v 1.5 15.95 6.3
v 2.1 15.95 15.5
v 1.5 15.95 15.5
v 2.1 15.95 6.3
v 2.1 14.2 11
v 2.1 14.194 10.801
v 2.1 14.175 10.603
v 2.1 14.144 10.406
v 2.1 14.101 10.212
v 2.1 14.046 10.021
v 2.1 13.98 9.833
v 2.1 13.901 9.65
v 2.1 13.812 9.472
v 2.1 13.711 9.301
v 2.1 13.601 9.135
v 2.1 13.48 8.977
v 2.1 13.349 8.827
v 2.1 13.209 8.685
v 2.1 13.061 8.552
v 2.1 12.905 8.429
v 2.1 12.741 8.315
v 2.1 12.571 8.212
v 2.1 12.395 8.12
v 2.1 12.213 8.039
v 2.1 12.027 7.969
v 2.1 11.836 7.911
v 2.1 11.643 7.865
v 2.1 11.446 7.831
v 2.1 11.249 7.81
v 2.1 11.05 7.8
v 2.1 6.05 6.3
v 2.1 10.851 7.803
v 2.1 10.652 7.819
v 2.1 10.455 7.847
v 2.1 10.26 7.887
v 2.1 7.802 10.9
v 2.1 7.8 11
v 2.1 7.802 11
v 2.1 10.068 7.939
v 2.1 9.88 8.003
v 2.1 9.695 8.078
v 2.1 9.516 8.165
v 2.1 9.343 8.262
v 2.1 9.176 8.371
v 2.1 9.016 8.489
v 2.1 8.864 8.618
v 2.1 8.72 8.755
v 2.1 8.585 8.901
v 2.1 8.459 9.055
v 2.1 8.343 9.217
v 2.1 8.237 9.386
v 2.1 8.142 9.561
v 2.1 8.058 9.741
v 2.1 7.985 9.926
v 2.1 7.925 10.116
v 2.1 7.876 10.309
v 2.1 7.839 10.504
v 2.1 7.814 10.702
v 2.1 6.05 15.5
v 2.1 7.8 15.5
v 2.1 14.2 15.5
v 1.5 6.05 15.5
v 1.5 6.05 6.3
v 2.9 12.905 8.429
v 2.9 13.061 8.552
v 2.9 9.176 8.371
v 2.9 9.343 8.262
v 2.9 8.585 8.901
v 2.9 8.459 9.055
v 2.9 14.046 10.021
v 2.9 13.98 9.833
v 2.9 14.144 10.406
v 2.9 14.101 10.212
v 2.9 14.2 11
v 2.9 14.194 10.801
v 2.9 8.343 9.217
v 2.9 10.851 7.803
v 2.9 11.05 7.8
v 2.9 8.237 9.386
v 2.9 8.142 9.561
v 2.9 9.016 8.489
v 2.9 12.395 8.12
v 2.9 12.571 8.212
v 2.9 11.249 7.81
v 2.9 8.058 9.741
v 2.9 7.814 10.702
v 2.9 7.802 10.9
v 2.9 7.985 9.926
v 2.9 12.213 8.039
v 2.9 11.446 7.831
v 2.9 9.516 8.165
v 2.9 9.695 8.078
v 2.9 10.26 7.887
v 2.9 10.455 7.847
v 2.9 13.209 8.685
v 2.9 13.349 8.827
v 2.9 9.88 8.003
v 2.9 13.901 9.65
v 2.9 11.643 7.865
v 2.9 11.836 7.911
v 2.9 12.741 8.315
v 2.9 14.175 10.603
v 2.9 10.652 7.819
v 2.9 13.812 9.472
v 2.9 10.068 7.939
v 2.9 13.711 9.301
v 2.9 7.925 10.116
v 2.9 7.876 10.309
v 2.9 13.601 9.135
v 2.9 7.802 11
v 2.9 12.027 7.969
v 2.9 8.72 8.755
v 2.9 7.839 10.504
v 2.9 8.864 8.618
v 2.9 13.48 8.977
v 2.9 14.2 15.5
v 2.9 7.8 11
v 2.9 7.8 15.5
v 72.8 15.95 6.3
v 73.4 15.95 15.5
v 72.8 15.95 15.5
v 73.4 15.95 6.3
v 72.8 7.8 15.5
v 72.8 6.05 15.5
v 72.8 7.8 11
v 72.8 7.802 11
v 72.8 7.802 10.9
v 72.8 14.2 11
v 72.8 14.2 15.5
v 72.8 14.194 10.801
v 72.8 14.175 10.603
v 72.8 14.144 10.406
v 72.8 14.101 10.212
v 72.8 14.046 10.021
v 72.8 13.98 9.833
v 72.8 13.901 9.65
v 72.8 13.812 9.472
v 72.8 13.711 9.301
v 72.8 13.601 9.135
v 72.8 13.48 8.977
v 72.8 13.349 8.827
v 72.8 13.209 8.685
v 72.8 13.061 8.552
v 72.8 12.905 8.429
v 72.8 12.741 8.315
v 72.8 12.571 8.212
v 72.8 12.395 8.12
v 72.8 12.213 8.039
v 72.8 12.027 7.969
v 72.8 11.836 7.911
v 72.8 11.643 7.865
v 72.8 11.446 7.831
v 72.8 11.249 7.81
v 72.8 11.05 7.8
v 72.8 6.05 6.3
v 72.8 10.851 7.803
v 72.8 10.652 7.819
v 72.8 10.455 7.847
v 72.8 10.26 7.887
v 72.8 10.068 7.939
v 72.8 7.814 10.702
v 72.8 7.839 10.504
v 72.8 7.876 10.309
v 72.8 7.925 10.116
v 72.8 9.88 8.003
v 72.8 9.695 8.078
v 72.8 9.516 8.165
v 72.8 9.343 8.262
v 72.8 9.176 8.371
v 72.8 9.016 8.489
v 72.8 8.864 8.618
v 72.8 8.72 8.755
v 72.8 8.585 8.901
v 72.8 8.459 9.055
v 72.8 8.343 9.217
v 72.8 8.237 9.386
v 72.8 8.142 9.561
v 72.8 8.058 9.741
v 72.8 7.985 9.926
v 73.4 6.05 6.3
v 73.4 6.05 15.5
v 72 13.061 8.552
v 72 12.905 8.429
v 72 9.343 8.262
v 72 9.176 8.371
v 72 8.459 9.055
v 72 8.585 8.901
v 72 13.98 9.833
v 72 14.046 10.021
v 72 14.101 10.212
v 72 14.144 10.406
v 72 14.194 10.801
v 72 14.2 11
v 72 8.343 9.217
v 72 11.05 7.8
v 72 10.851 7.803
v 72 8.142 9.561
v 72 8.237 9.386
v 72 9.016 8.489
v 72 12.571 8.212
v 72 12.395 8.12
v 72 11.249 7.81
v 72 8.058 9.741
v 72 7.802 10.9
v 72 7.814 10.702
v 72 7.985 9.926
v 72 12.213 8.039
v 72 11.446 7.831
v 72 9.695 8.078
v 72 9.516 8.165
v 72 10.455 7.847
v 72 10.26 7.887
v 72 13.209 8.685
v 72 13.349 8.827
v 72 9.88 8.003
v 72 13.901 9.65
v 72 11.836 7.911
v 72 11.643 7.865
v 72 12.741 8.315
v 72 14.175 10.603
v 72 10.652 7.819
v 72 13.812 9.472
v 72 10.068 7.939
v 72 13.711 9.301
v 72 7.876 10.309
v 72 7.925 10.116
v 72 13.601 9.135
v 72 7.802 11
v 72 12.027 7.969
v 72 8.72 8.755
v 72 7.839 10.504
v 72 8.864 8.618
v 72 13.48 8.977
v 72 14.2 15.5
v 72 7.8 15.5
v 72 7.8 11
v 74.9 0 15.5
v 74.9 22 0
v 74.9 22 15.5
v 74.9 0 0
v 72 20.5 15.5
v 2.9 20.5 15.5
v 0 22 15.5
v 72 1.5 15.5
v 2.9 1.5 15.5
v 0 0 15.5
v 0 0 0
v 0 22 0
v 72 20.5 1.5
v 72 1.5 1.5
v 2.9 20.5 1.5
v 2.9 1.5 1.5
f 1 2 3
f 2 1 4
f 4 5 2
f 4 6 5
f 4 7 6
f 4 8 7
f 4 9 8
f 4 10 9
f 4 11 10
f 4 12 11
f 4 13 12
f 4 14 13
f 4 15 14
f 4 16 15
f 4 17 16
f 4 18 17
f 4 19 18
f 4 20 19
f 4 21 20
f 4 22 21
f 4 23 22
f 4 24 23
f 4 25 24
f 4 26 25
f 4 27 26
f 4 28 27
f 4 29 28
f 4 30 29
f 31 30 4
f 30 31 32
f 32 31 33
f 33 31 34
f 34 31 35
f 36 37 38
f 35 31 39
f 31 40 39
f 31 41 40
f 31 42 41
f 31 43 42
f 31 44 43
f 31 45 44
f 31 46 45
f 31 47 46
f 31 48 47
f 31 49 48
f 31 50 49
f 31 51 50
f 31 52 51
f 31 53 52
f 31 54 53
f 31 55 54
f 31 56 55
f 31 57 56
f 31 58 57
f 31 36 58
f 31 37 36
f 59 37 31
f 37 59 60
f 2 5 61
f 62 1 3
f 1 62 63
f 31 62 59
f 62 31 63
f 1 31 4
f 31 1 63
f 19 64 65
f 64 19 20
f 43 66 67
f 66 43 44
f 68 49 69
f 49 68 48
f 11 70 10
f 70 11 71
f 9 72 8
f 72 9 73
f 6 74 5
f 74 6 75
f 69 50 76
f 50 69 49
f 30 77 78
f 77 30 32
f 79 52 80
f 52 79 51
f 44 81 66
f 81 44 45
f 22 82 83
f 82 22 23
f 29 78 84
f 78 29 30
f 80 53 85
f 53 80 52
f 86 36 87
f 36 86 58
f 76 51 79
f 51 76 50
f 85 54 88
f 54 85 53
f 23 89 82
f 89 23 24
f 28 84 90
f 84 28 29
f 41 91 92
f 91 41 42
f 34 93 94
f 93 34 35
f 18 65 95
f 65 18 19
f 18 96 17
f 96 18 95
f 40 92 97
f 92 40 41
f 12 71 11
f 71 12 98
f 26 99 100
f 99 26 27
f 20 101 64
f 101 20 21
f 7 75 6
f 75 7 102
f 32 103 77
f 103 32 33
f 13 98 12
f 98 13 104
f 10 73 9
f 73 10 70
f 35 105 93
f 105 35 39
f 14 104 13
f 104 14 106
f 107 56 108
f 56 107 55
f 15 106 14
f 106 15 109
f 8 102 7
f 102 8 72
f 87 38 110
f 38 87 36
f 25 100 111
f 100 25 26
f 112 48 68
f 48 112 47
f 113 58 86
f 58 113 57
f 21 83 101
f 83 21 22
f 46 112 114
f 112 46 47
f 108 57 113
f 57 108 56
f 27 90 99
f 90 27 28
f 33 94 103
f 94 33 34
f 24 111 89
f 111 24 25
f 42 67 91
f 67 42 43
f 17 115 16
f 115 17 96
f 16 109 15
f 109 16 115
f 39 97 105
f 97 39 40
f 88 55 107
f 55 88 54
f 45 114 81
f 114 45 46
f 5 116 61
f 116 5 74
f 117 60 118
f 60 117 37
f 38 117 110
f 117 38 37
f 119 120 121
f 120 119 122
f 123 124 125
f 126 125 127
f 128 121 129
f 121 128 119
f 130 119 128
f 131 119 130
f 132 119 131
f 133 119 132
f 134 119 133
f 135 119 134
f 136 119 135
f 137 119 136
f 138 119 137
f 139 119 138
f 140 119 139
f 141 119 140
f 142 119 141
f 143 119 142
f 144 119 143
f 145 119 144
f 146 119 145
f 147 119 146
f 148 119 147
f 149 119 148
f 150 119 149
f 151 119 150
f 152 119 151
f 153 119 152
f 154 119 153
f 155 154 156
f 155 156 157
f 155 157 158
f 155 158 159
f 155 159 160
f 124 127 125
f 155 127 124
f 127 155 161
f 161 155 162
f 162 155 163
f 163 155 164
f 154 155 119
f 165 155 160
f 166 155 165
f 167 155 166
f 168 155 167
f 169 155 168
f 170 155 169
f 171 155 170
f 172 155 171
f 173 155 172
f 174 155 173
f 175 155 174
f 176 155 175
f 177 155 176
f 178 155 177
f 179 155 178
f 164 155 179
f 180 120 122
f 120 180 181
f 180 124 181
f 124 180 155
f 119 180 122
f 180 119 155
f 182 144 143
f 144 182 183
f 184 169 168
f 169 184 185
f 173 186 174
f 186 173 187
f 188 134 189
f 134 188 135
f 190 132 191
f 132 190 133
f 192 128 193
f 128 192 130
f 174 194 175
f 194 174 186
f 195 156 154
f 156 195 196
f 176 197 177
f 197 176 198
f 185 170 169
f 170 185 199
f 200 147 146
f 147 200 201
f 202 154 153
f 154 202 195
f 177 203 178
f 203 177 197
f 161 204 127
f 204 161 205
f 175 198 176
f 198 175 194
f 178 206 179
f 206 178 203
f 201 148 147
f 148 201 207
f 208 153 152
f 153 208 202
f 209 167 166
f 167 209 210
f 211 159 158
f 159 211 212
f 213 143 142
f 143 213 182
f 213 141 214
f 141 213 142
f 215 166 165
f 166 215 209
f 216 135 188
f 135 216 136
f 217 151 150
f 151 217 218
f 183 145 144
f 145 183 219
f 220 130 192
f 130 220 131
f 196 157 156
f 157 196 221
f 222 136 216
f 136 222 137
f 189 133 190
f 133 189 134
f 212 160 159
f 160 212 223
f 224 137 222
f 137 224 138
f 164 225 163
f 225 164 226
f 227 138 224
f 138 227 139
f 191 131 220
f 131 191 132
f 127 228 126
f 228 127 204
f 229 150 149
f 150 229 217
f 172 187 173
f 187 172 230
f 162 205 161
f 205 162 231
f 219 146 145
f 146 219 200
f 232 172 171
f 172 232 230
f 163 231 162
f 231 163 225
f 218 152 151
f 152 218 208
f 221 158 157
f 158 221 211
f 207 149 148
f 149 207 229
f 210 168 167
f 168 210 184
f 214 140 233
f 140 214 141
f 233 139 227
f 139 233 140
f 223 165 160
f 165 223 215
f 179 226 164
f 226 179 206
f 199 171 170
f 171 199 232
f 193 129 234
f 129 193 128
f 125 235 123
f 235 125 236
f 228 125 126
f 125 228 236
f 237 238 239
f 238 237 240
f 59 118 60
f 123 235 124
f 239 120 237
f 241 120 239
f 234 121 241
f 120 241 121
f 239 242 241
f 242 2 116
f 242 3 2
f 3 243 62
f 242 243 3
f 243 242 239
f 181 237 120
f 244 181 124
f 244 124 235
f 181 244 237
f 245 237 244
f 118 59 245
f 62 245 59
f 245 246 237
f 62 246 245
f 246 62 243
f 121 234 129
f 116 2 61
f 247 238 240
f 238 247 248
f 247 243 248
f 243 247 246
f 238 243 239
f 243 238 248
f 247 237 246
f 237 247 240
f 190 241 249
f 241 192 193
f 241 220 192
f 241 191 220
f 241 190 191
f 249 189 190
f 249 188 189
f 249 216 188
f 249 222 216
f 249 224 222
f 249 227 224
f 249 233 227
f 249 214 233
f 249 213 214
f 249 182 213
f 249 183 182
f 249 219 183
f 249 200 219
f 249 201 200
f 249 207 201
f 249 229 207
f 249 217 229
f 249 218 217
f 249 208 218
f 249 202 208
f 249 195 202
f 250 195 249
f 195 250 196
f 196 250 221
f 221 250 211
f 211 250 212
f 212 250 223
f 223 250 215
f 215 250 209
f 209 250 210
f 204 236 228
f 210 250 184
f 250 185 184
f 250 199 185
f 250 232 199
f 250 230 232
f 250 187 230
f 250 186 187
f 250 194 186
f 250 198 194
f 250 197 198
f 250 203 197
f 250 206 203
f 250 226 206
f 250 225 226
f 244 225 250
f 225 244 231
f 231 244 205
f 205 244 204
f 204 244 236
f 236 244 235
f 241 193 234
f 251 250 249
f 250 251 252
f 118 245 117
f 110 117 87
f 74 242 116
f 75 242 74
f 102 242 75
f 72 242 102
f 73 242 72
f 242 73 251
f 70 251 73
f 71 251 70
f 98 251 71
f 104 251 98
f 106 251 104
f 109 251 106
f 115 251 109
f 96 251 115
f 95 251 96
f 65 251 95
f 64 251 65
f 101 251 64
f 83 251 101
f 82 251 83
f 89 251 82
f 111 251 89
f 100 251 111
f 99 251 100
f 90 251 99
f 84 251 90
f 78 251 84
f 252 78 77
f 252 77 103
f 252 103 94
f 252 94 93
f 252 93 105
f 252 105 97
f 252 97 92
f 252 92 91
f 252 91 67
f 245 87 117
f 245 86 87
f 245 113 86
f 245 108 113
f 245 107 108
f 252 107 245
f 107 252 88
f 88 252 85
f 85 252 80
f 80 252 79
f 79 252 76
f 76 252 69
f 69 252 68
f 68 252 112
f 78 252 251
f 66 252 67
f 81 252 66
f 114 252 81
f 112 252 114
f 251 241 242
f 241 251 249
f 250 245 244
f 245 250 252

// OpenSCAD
use <bendlib.scad>;

function battery(dim = undef, plus_dim = undef, minus_dim = undef) = [
    bl_def(dim, [18,65]), 
    bl_def(plus_dim, [0,0]), 
    bl_def(minus_dim, [0,0])
];
function battery_18650(flat=false) = battery([18,65], flat ? undef : [5.5, 1.5]);
function battery_32700() = battery([32,70]);

function battery_dim(type) = type[0];
function battery_plus_dim(type) = type[1];
function battery_minus_dim(type) = type[2];
function battery_full_dim(type) = [
    max(battery_dim(type)[0], battery_plus_dim(type)[0], battery_minus_dim(type)[0]), 
    battery_minus_dim(type)[1] + battery_dim(type)[1] + battery_plus_dim(type)[1]
];
function battery_flat(type) = type[1] == [0,0] && type[2] == [0,0];

module battery(type = battery_18650()) {
    dim = battery_dim(type);
    plus_dim = battery_plus_dim(type);    
    minus_dim = battery_minus_dim(type);
    colors = ["black", "black","gray","red", "red"];
    bl_tower([minus_dim[1], dim[1]*0.1, dim[1]*0.8, dim[1]*0.1, plus_dim[1]]) {
        color(colors[$index])
        cylinder(d = $index == 0 ? minus_dim[0] : $index == 4 ? plus_dim[0] : dim[0], h = $height);
    }
}

function battery_contact(
    dim = undef, 
    length = undef, 
    dia = undef
) = let(
    dim = bl_def(dim, [9.5, 9, 0.2]),
    length = bl_def(length, 1.5),
    dia = bl_def(dia, 6)
) [ dim, length, dia ];

function battery_contact_plus() = battery_contact();
function battery_contact_minus() = battery_contact(length = 9);
function battery_contact_dim(type) = type[0];
function battery_contact_length(type) = type[1];
function battery_contact_dia(type) = type[2];

module battery_contact(type = battery_contact_plus()) {
    dim = battery_contact_dim(type);
    length = battery_contact_length(type); 
    dia = battery_contact_dia(type);
    union() {
        translate([-dim[0]/2,-dim[1]/2,0])
        linear_extrude(dim[2]) {
            bl_square(dim, [3,3,1,1]);
            translate([(dim[0]-2.4)/2,0])
            bl_square([2.4,15],[1.2,1.2,0,0]);
        }
        cylinder(d = dia, h = length);
    }
}

function battery_contact_diff(
    contact = undef, 
    height = undef, 
    tolerance = undef, 
    wall = undef
) = let (
    contact = bl_def(contact, battery_contact_plus()),
    height = bl_def(height, battery_contact_dim(contact)[1]/2),
    tolerance = bl_def(tolerance, 0.2),
    wall = bl_def(wall, 0.8)
) [ 
    contact, 
    height, 
    tolerance, 
    wall
];

function battery_contact_diff_contact(type) = type[0];
function battery_contact_diff_height(type) = type[1];
function battery_contact_diff_tolerance(type) = type[2];
function battery_contact_diff_wall(type) = type[3];

function battery_contact_diff_dim(type) = bl_mul(battery_contact_dim(battery_contact_diff_contact(type)),[1,0.5,1]) + 
    [0,battery_contact_diff_height(type),0] + 
    bl_3d(battery_contact_diff_tolerance(type)*2);
    
function battery_contact_diff_full_dim(type) = battery_contact_diff_dim(type) + [0,0,battery_contact_diff_wall(type)];

module battery_contact_diff(type = battery_contact_diff()) {
    contact = battery_contact_diff_contact(type);
    
    contact_dim = battery_contact_dim(contact);
    contact_dia = battery_contact_dia(contact);
    height = battery_contact_diff_height(type);
    tolerance = battery_contact_diff_tolerance(type);
    wall = battery_contact_diff_wall(type);
    
    diff_dim = battery_contact_diff_dim(type);
    union() {
        translate([-diff_dim[0]/2,-contact_dim[1]/2-tolerance,0])
        cube(diff_dim);
        
        d = contact_dia + tolerance*2;
        h = diff_dim[2] + wall + tolerance;
        
        cylinder(d = d, h = h);
        translate([-d/2,0,0])
        cube([d, height + tolerance, h]);
    }
}

function battery_box(
    battery = undef,
    thickness = undef,
    battery_tolerance = undef,
    contact_diff = undef,
    minus_length = undef
) = let(
    battery = bl_def(battery, battery_18650()),
    thickness = bl_3d(bl_def(thickness, 1.5)),
    battery_tolerance = bl_3d(bl_def(battery_tolerance, 0.5)),
    contact_diff = bl_def(contact_diff, battery_contact_diff()),
    minus_length = bl_def(minus_length, battery_contact_length(battery_contact_minus()))
) [
    battery,
    thickness,
    battery_tolerance,
    contact_diff,
    minus_length
];

function battery_box_battery(type) = type[0];

function battery_box_thickness(type) = type[1];
function battery_box_battery_tolerance(type) = type[2];
function battery_box_contact_diff(type) = type[3];
function battery_box_minus_length(type) = type[4];

function battery_box_battery_dim(type) = battery_dim(battery_box_battery(type));
function battery_box_contact(type) = battery_contact_diff_contact(battery_box_contact_diff(type));
function battery_box_contact_thickness(type) = battery_contact_diff_full_dim(battery_box_contact_diff(type))[2];
function battery_box_contact_offset(type) = let(
    thickness = battery_box_thickness(type),
    battery_tolerance = battery_box_battery_tolerance(type),
    battery_dim = battery_box_battery_dim(type)
) [
    thickness[0],
    thickness[1] + battery_tolerance[1] + battery_dim[0]/2,
    thickness[2] + battery_tolerance[2] + battery_dim[0]/2,
];

function battery_box_battery_offset(type) = battery_box_contact_offset(type) + 
    [battery_box_contact_thickness(type)+battery_box_inner_dim(type)[0]-battery_box_battery_dim(type)[1]-battery_box_battery_tolerance(type)[0],0,0];
    
function battery_box_inner_dim(type) = let(
    contact_diff = battery_box_contact_diff(type),
    battery_dim = battery_dim(battery_box_battery(type)),
    battery_tolerance = battery_box_battery_tolerance(type),
    minus_length = battery_box_minus_length(type)
) bl_mul(battery_tolerance, [2,2,1]) + [
    battery_dim[1] + minus_length/2 - battery_box_contact_thickness(type),
    battery_dim[0],
    battery_dim[0]/2 + battery_contact_diff_height(contact_diff)
];

function battery_box_outer_dim(type) = let(
    box_thickness = battery_box_thickness(type), 
    contact_diff = battery_box_contact_diff(type)
) battery_box_inner_dim(type) + [
    battery_contact_diff_full_dim(contact_diff)[2]*2 + box_thickness[0]*2,
    box_thickness[1]*2,
    box_thickness[2]
];

module battery_box_contact_placement(type) {
    contact_offset = battery_box_contact_offset(type);
    outer_dim = battery_box_outer_dim(type);
    translate(contact_offset)
    rotate([90,0,90]) {
        $contact_type = true;
        children();
    }
    translate([outer_dim[0],0,0])
    mirror([-1,0,0])
    translate(contact_offset)
    rotate([90,0,90]) {
        $contact_type = false; 
        children();
    }
}

module battery_box_contact(type, contact_type) {
    contact = battery_box_contact(type);
    use_contact = contact_type ? battery_contact(
        dim = battery_contact_dim(contact), 
        dia = battery_contact_dia(contact), 
        length = battery_box_minus_length(type)
    ) : contact;
    battery_contact(use_contact);
}

module battery_box(type = battery_box(), with_battery = false, with_contacts = false) {
    thickness = battery_box_thickness(type);
    diff = battery_box_contact_diff(type);
    battery_tolerance = battery_box_battery_tolerance(type);
    outer_dim = battery_box_outer_dim(type);
    inner_dim = battery_box_inner_dim(type);
    difference() {
        cube(outer_dim);
        translate(bl_mul(outer_dim - inner_dim, [0.5,0.5,1]))
        cube(inner_dim + [0,0,battery_contact_diff_tolerance(diff)]);
        battery_box_contact_placement(type)
            battery_contact_diff(diff);
    }
    if (with_battery) {
        translate(battery_box_battery_offset(type))
        rotate([0,90,0])
        battery(battery_box_battery(type));
    }
    if (with_contacts) {
        battery_box_contact_placement(type) {
            battery_box_contact(type, $contact_type);
        }
    }
}




$fa = 0.2;
$fs = 0.2;

*battery();
*battery_contact();
//battery_contact_diff(contact=battery_contact_minus()));
battery_box();

*battery_contact_diff();


*battery(battery_32700());
